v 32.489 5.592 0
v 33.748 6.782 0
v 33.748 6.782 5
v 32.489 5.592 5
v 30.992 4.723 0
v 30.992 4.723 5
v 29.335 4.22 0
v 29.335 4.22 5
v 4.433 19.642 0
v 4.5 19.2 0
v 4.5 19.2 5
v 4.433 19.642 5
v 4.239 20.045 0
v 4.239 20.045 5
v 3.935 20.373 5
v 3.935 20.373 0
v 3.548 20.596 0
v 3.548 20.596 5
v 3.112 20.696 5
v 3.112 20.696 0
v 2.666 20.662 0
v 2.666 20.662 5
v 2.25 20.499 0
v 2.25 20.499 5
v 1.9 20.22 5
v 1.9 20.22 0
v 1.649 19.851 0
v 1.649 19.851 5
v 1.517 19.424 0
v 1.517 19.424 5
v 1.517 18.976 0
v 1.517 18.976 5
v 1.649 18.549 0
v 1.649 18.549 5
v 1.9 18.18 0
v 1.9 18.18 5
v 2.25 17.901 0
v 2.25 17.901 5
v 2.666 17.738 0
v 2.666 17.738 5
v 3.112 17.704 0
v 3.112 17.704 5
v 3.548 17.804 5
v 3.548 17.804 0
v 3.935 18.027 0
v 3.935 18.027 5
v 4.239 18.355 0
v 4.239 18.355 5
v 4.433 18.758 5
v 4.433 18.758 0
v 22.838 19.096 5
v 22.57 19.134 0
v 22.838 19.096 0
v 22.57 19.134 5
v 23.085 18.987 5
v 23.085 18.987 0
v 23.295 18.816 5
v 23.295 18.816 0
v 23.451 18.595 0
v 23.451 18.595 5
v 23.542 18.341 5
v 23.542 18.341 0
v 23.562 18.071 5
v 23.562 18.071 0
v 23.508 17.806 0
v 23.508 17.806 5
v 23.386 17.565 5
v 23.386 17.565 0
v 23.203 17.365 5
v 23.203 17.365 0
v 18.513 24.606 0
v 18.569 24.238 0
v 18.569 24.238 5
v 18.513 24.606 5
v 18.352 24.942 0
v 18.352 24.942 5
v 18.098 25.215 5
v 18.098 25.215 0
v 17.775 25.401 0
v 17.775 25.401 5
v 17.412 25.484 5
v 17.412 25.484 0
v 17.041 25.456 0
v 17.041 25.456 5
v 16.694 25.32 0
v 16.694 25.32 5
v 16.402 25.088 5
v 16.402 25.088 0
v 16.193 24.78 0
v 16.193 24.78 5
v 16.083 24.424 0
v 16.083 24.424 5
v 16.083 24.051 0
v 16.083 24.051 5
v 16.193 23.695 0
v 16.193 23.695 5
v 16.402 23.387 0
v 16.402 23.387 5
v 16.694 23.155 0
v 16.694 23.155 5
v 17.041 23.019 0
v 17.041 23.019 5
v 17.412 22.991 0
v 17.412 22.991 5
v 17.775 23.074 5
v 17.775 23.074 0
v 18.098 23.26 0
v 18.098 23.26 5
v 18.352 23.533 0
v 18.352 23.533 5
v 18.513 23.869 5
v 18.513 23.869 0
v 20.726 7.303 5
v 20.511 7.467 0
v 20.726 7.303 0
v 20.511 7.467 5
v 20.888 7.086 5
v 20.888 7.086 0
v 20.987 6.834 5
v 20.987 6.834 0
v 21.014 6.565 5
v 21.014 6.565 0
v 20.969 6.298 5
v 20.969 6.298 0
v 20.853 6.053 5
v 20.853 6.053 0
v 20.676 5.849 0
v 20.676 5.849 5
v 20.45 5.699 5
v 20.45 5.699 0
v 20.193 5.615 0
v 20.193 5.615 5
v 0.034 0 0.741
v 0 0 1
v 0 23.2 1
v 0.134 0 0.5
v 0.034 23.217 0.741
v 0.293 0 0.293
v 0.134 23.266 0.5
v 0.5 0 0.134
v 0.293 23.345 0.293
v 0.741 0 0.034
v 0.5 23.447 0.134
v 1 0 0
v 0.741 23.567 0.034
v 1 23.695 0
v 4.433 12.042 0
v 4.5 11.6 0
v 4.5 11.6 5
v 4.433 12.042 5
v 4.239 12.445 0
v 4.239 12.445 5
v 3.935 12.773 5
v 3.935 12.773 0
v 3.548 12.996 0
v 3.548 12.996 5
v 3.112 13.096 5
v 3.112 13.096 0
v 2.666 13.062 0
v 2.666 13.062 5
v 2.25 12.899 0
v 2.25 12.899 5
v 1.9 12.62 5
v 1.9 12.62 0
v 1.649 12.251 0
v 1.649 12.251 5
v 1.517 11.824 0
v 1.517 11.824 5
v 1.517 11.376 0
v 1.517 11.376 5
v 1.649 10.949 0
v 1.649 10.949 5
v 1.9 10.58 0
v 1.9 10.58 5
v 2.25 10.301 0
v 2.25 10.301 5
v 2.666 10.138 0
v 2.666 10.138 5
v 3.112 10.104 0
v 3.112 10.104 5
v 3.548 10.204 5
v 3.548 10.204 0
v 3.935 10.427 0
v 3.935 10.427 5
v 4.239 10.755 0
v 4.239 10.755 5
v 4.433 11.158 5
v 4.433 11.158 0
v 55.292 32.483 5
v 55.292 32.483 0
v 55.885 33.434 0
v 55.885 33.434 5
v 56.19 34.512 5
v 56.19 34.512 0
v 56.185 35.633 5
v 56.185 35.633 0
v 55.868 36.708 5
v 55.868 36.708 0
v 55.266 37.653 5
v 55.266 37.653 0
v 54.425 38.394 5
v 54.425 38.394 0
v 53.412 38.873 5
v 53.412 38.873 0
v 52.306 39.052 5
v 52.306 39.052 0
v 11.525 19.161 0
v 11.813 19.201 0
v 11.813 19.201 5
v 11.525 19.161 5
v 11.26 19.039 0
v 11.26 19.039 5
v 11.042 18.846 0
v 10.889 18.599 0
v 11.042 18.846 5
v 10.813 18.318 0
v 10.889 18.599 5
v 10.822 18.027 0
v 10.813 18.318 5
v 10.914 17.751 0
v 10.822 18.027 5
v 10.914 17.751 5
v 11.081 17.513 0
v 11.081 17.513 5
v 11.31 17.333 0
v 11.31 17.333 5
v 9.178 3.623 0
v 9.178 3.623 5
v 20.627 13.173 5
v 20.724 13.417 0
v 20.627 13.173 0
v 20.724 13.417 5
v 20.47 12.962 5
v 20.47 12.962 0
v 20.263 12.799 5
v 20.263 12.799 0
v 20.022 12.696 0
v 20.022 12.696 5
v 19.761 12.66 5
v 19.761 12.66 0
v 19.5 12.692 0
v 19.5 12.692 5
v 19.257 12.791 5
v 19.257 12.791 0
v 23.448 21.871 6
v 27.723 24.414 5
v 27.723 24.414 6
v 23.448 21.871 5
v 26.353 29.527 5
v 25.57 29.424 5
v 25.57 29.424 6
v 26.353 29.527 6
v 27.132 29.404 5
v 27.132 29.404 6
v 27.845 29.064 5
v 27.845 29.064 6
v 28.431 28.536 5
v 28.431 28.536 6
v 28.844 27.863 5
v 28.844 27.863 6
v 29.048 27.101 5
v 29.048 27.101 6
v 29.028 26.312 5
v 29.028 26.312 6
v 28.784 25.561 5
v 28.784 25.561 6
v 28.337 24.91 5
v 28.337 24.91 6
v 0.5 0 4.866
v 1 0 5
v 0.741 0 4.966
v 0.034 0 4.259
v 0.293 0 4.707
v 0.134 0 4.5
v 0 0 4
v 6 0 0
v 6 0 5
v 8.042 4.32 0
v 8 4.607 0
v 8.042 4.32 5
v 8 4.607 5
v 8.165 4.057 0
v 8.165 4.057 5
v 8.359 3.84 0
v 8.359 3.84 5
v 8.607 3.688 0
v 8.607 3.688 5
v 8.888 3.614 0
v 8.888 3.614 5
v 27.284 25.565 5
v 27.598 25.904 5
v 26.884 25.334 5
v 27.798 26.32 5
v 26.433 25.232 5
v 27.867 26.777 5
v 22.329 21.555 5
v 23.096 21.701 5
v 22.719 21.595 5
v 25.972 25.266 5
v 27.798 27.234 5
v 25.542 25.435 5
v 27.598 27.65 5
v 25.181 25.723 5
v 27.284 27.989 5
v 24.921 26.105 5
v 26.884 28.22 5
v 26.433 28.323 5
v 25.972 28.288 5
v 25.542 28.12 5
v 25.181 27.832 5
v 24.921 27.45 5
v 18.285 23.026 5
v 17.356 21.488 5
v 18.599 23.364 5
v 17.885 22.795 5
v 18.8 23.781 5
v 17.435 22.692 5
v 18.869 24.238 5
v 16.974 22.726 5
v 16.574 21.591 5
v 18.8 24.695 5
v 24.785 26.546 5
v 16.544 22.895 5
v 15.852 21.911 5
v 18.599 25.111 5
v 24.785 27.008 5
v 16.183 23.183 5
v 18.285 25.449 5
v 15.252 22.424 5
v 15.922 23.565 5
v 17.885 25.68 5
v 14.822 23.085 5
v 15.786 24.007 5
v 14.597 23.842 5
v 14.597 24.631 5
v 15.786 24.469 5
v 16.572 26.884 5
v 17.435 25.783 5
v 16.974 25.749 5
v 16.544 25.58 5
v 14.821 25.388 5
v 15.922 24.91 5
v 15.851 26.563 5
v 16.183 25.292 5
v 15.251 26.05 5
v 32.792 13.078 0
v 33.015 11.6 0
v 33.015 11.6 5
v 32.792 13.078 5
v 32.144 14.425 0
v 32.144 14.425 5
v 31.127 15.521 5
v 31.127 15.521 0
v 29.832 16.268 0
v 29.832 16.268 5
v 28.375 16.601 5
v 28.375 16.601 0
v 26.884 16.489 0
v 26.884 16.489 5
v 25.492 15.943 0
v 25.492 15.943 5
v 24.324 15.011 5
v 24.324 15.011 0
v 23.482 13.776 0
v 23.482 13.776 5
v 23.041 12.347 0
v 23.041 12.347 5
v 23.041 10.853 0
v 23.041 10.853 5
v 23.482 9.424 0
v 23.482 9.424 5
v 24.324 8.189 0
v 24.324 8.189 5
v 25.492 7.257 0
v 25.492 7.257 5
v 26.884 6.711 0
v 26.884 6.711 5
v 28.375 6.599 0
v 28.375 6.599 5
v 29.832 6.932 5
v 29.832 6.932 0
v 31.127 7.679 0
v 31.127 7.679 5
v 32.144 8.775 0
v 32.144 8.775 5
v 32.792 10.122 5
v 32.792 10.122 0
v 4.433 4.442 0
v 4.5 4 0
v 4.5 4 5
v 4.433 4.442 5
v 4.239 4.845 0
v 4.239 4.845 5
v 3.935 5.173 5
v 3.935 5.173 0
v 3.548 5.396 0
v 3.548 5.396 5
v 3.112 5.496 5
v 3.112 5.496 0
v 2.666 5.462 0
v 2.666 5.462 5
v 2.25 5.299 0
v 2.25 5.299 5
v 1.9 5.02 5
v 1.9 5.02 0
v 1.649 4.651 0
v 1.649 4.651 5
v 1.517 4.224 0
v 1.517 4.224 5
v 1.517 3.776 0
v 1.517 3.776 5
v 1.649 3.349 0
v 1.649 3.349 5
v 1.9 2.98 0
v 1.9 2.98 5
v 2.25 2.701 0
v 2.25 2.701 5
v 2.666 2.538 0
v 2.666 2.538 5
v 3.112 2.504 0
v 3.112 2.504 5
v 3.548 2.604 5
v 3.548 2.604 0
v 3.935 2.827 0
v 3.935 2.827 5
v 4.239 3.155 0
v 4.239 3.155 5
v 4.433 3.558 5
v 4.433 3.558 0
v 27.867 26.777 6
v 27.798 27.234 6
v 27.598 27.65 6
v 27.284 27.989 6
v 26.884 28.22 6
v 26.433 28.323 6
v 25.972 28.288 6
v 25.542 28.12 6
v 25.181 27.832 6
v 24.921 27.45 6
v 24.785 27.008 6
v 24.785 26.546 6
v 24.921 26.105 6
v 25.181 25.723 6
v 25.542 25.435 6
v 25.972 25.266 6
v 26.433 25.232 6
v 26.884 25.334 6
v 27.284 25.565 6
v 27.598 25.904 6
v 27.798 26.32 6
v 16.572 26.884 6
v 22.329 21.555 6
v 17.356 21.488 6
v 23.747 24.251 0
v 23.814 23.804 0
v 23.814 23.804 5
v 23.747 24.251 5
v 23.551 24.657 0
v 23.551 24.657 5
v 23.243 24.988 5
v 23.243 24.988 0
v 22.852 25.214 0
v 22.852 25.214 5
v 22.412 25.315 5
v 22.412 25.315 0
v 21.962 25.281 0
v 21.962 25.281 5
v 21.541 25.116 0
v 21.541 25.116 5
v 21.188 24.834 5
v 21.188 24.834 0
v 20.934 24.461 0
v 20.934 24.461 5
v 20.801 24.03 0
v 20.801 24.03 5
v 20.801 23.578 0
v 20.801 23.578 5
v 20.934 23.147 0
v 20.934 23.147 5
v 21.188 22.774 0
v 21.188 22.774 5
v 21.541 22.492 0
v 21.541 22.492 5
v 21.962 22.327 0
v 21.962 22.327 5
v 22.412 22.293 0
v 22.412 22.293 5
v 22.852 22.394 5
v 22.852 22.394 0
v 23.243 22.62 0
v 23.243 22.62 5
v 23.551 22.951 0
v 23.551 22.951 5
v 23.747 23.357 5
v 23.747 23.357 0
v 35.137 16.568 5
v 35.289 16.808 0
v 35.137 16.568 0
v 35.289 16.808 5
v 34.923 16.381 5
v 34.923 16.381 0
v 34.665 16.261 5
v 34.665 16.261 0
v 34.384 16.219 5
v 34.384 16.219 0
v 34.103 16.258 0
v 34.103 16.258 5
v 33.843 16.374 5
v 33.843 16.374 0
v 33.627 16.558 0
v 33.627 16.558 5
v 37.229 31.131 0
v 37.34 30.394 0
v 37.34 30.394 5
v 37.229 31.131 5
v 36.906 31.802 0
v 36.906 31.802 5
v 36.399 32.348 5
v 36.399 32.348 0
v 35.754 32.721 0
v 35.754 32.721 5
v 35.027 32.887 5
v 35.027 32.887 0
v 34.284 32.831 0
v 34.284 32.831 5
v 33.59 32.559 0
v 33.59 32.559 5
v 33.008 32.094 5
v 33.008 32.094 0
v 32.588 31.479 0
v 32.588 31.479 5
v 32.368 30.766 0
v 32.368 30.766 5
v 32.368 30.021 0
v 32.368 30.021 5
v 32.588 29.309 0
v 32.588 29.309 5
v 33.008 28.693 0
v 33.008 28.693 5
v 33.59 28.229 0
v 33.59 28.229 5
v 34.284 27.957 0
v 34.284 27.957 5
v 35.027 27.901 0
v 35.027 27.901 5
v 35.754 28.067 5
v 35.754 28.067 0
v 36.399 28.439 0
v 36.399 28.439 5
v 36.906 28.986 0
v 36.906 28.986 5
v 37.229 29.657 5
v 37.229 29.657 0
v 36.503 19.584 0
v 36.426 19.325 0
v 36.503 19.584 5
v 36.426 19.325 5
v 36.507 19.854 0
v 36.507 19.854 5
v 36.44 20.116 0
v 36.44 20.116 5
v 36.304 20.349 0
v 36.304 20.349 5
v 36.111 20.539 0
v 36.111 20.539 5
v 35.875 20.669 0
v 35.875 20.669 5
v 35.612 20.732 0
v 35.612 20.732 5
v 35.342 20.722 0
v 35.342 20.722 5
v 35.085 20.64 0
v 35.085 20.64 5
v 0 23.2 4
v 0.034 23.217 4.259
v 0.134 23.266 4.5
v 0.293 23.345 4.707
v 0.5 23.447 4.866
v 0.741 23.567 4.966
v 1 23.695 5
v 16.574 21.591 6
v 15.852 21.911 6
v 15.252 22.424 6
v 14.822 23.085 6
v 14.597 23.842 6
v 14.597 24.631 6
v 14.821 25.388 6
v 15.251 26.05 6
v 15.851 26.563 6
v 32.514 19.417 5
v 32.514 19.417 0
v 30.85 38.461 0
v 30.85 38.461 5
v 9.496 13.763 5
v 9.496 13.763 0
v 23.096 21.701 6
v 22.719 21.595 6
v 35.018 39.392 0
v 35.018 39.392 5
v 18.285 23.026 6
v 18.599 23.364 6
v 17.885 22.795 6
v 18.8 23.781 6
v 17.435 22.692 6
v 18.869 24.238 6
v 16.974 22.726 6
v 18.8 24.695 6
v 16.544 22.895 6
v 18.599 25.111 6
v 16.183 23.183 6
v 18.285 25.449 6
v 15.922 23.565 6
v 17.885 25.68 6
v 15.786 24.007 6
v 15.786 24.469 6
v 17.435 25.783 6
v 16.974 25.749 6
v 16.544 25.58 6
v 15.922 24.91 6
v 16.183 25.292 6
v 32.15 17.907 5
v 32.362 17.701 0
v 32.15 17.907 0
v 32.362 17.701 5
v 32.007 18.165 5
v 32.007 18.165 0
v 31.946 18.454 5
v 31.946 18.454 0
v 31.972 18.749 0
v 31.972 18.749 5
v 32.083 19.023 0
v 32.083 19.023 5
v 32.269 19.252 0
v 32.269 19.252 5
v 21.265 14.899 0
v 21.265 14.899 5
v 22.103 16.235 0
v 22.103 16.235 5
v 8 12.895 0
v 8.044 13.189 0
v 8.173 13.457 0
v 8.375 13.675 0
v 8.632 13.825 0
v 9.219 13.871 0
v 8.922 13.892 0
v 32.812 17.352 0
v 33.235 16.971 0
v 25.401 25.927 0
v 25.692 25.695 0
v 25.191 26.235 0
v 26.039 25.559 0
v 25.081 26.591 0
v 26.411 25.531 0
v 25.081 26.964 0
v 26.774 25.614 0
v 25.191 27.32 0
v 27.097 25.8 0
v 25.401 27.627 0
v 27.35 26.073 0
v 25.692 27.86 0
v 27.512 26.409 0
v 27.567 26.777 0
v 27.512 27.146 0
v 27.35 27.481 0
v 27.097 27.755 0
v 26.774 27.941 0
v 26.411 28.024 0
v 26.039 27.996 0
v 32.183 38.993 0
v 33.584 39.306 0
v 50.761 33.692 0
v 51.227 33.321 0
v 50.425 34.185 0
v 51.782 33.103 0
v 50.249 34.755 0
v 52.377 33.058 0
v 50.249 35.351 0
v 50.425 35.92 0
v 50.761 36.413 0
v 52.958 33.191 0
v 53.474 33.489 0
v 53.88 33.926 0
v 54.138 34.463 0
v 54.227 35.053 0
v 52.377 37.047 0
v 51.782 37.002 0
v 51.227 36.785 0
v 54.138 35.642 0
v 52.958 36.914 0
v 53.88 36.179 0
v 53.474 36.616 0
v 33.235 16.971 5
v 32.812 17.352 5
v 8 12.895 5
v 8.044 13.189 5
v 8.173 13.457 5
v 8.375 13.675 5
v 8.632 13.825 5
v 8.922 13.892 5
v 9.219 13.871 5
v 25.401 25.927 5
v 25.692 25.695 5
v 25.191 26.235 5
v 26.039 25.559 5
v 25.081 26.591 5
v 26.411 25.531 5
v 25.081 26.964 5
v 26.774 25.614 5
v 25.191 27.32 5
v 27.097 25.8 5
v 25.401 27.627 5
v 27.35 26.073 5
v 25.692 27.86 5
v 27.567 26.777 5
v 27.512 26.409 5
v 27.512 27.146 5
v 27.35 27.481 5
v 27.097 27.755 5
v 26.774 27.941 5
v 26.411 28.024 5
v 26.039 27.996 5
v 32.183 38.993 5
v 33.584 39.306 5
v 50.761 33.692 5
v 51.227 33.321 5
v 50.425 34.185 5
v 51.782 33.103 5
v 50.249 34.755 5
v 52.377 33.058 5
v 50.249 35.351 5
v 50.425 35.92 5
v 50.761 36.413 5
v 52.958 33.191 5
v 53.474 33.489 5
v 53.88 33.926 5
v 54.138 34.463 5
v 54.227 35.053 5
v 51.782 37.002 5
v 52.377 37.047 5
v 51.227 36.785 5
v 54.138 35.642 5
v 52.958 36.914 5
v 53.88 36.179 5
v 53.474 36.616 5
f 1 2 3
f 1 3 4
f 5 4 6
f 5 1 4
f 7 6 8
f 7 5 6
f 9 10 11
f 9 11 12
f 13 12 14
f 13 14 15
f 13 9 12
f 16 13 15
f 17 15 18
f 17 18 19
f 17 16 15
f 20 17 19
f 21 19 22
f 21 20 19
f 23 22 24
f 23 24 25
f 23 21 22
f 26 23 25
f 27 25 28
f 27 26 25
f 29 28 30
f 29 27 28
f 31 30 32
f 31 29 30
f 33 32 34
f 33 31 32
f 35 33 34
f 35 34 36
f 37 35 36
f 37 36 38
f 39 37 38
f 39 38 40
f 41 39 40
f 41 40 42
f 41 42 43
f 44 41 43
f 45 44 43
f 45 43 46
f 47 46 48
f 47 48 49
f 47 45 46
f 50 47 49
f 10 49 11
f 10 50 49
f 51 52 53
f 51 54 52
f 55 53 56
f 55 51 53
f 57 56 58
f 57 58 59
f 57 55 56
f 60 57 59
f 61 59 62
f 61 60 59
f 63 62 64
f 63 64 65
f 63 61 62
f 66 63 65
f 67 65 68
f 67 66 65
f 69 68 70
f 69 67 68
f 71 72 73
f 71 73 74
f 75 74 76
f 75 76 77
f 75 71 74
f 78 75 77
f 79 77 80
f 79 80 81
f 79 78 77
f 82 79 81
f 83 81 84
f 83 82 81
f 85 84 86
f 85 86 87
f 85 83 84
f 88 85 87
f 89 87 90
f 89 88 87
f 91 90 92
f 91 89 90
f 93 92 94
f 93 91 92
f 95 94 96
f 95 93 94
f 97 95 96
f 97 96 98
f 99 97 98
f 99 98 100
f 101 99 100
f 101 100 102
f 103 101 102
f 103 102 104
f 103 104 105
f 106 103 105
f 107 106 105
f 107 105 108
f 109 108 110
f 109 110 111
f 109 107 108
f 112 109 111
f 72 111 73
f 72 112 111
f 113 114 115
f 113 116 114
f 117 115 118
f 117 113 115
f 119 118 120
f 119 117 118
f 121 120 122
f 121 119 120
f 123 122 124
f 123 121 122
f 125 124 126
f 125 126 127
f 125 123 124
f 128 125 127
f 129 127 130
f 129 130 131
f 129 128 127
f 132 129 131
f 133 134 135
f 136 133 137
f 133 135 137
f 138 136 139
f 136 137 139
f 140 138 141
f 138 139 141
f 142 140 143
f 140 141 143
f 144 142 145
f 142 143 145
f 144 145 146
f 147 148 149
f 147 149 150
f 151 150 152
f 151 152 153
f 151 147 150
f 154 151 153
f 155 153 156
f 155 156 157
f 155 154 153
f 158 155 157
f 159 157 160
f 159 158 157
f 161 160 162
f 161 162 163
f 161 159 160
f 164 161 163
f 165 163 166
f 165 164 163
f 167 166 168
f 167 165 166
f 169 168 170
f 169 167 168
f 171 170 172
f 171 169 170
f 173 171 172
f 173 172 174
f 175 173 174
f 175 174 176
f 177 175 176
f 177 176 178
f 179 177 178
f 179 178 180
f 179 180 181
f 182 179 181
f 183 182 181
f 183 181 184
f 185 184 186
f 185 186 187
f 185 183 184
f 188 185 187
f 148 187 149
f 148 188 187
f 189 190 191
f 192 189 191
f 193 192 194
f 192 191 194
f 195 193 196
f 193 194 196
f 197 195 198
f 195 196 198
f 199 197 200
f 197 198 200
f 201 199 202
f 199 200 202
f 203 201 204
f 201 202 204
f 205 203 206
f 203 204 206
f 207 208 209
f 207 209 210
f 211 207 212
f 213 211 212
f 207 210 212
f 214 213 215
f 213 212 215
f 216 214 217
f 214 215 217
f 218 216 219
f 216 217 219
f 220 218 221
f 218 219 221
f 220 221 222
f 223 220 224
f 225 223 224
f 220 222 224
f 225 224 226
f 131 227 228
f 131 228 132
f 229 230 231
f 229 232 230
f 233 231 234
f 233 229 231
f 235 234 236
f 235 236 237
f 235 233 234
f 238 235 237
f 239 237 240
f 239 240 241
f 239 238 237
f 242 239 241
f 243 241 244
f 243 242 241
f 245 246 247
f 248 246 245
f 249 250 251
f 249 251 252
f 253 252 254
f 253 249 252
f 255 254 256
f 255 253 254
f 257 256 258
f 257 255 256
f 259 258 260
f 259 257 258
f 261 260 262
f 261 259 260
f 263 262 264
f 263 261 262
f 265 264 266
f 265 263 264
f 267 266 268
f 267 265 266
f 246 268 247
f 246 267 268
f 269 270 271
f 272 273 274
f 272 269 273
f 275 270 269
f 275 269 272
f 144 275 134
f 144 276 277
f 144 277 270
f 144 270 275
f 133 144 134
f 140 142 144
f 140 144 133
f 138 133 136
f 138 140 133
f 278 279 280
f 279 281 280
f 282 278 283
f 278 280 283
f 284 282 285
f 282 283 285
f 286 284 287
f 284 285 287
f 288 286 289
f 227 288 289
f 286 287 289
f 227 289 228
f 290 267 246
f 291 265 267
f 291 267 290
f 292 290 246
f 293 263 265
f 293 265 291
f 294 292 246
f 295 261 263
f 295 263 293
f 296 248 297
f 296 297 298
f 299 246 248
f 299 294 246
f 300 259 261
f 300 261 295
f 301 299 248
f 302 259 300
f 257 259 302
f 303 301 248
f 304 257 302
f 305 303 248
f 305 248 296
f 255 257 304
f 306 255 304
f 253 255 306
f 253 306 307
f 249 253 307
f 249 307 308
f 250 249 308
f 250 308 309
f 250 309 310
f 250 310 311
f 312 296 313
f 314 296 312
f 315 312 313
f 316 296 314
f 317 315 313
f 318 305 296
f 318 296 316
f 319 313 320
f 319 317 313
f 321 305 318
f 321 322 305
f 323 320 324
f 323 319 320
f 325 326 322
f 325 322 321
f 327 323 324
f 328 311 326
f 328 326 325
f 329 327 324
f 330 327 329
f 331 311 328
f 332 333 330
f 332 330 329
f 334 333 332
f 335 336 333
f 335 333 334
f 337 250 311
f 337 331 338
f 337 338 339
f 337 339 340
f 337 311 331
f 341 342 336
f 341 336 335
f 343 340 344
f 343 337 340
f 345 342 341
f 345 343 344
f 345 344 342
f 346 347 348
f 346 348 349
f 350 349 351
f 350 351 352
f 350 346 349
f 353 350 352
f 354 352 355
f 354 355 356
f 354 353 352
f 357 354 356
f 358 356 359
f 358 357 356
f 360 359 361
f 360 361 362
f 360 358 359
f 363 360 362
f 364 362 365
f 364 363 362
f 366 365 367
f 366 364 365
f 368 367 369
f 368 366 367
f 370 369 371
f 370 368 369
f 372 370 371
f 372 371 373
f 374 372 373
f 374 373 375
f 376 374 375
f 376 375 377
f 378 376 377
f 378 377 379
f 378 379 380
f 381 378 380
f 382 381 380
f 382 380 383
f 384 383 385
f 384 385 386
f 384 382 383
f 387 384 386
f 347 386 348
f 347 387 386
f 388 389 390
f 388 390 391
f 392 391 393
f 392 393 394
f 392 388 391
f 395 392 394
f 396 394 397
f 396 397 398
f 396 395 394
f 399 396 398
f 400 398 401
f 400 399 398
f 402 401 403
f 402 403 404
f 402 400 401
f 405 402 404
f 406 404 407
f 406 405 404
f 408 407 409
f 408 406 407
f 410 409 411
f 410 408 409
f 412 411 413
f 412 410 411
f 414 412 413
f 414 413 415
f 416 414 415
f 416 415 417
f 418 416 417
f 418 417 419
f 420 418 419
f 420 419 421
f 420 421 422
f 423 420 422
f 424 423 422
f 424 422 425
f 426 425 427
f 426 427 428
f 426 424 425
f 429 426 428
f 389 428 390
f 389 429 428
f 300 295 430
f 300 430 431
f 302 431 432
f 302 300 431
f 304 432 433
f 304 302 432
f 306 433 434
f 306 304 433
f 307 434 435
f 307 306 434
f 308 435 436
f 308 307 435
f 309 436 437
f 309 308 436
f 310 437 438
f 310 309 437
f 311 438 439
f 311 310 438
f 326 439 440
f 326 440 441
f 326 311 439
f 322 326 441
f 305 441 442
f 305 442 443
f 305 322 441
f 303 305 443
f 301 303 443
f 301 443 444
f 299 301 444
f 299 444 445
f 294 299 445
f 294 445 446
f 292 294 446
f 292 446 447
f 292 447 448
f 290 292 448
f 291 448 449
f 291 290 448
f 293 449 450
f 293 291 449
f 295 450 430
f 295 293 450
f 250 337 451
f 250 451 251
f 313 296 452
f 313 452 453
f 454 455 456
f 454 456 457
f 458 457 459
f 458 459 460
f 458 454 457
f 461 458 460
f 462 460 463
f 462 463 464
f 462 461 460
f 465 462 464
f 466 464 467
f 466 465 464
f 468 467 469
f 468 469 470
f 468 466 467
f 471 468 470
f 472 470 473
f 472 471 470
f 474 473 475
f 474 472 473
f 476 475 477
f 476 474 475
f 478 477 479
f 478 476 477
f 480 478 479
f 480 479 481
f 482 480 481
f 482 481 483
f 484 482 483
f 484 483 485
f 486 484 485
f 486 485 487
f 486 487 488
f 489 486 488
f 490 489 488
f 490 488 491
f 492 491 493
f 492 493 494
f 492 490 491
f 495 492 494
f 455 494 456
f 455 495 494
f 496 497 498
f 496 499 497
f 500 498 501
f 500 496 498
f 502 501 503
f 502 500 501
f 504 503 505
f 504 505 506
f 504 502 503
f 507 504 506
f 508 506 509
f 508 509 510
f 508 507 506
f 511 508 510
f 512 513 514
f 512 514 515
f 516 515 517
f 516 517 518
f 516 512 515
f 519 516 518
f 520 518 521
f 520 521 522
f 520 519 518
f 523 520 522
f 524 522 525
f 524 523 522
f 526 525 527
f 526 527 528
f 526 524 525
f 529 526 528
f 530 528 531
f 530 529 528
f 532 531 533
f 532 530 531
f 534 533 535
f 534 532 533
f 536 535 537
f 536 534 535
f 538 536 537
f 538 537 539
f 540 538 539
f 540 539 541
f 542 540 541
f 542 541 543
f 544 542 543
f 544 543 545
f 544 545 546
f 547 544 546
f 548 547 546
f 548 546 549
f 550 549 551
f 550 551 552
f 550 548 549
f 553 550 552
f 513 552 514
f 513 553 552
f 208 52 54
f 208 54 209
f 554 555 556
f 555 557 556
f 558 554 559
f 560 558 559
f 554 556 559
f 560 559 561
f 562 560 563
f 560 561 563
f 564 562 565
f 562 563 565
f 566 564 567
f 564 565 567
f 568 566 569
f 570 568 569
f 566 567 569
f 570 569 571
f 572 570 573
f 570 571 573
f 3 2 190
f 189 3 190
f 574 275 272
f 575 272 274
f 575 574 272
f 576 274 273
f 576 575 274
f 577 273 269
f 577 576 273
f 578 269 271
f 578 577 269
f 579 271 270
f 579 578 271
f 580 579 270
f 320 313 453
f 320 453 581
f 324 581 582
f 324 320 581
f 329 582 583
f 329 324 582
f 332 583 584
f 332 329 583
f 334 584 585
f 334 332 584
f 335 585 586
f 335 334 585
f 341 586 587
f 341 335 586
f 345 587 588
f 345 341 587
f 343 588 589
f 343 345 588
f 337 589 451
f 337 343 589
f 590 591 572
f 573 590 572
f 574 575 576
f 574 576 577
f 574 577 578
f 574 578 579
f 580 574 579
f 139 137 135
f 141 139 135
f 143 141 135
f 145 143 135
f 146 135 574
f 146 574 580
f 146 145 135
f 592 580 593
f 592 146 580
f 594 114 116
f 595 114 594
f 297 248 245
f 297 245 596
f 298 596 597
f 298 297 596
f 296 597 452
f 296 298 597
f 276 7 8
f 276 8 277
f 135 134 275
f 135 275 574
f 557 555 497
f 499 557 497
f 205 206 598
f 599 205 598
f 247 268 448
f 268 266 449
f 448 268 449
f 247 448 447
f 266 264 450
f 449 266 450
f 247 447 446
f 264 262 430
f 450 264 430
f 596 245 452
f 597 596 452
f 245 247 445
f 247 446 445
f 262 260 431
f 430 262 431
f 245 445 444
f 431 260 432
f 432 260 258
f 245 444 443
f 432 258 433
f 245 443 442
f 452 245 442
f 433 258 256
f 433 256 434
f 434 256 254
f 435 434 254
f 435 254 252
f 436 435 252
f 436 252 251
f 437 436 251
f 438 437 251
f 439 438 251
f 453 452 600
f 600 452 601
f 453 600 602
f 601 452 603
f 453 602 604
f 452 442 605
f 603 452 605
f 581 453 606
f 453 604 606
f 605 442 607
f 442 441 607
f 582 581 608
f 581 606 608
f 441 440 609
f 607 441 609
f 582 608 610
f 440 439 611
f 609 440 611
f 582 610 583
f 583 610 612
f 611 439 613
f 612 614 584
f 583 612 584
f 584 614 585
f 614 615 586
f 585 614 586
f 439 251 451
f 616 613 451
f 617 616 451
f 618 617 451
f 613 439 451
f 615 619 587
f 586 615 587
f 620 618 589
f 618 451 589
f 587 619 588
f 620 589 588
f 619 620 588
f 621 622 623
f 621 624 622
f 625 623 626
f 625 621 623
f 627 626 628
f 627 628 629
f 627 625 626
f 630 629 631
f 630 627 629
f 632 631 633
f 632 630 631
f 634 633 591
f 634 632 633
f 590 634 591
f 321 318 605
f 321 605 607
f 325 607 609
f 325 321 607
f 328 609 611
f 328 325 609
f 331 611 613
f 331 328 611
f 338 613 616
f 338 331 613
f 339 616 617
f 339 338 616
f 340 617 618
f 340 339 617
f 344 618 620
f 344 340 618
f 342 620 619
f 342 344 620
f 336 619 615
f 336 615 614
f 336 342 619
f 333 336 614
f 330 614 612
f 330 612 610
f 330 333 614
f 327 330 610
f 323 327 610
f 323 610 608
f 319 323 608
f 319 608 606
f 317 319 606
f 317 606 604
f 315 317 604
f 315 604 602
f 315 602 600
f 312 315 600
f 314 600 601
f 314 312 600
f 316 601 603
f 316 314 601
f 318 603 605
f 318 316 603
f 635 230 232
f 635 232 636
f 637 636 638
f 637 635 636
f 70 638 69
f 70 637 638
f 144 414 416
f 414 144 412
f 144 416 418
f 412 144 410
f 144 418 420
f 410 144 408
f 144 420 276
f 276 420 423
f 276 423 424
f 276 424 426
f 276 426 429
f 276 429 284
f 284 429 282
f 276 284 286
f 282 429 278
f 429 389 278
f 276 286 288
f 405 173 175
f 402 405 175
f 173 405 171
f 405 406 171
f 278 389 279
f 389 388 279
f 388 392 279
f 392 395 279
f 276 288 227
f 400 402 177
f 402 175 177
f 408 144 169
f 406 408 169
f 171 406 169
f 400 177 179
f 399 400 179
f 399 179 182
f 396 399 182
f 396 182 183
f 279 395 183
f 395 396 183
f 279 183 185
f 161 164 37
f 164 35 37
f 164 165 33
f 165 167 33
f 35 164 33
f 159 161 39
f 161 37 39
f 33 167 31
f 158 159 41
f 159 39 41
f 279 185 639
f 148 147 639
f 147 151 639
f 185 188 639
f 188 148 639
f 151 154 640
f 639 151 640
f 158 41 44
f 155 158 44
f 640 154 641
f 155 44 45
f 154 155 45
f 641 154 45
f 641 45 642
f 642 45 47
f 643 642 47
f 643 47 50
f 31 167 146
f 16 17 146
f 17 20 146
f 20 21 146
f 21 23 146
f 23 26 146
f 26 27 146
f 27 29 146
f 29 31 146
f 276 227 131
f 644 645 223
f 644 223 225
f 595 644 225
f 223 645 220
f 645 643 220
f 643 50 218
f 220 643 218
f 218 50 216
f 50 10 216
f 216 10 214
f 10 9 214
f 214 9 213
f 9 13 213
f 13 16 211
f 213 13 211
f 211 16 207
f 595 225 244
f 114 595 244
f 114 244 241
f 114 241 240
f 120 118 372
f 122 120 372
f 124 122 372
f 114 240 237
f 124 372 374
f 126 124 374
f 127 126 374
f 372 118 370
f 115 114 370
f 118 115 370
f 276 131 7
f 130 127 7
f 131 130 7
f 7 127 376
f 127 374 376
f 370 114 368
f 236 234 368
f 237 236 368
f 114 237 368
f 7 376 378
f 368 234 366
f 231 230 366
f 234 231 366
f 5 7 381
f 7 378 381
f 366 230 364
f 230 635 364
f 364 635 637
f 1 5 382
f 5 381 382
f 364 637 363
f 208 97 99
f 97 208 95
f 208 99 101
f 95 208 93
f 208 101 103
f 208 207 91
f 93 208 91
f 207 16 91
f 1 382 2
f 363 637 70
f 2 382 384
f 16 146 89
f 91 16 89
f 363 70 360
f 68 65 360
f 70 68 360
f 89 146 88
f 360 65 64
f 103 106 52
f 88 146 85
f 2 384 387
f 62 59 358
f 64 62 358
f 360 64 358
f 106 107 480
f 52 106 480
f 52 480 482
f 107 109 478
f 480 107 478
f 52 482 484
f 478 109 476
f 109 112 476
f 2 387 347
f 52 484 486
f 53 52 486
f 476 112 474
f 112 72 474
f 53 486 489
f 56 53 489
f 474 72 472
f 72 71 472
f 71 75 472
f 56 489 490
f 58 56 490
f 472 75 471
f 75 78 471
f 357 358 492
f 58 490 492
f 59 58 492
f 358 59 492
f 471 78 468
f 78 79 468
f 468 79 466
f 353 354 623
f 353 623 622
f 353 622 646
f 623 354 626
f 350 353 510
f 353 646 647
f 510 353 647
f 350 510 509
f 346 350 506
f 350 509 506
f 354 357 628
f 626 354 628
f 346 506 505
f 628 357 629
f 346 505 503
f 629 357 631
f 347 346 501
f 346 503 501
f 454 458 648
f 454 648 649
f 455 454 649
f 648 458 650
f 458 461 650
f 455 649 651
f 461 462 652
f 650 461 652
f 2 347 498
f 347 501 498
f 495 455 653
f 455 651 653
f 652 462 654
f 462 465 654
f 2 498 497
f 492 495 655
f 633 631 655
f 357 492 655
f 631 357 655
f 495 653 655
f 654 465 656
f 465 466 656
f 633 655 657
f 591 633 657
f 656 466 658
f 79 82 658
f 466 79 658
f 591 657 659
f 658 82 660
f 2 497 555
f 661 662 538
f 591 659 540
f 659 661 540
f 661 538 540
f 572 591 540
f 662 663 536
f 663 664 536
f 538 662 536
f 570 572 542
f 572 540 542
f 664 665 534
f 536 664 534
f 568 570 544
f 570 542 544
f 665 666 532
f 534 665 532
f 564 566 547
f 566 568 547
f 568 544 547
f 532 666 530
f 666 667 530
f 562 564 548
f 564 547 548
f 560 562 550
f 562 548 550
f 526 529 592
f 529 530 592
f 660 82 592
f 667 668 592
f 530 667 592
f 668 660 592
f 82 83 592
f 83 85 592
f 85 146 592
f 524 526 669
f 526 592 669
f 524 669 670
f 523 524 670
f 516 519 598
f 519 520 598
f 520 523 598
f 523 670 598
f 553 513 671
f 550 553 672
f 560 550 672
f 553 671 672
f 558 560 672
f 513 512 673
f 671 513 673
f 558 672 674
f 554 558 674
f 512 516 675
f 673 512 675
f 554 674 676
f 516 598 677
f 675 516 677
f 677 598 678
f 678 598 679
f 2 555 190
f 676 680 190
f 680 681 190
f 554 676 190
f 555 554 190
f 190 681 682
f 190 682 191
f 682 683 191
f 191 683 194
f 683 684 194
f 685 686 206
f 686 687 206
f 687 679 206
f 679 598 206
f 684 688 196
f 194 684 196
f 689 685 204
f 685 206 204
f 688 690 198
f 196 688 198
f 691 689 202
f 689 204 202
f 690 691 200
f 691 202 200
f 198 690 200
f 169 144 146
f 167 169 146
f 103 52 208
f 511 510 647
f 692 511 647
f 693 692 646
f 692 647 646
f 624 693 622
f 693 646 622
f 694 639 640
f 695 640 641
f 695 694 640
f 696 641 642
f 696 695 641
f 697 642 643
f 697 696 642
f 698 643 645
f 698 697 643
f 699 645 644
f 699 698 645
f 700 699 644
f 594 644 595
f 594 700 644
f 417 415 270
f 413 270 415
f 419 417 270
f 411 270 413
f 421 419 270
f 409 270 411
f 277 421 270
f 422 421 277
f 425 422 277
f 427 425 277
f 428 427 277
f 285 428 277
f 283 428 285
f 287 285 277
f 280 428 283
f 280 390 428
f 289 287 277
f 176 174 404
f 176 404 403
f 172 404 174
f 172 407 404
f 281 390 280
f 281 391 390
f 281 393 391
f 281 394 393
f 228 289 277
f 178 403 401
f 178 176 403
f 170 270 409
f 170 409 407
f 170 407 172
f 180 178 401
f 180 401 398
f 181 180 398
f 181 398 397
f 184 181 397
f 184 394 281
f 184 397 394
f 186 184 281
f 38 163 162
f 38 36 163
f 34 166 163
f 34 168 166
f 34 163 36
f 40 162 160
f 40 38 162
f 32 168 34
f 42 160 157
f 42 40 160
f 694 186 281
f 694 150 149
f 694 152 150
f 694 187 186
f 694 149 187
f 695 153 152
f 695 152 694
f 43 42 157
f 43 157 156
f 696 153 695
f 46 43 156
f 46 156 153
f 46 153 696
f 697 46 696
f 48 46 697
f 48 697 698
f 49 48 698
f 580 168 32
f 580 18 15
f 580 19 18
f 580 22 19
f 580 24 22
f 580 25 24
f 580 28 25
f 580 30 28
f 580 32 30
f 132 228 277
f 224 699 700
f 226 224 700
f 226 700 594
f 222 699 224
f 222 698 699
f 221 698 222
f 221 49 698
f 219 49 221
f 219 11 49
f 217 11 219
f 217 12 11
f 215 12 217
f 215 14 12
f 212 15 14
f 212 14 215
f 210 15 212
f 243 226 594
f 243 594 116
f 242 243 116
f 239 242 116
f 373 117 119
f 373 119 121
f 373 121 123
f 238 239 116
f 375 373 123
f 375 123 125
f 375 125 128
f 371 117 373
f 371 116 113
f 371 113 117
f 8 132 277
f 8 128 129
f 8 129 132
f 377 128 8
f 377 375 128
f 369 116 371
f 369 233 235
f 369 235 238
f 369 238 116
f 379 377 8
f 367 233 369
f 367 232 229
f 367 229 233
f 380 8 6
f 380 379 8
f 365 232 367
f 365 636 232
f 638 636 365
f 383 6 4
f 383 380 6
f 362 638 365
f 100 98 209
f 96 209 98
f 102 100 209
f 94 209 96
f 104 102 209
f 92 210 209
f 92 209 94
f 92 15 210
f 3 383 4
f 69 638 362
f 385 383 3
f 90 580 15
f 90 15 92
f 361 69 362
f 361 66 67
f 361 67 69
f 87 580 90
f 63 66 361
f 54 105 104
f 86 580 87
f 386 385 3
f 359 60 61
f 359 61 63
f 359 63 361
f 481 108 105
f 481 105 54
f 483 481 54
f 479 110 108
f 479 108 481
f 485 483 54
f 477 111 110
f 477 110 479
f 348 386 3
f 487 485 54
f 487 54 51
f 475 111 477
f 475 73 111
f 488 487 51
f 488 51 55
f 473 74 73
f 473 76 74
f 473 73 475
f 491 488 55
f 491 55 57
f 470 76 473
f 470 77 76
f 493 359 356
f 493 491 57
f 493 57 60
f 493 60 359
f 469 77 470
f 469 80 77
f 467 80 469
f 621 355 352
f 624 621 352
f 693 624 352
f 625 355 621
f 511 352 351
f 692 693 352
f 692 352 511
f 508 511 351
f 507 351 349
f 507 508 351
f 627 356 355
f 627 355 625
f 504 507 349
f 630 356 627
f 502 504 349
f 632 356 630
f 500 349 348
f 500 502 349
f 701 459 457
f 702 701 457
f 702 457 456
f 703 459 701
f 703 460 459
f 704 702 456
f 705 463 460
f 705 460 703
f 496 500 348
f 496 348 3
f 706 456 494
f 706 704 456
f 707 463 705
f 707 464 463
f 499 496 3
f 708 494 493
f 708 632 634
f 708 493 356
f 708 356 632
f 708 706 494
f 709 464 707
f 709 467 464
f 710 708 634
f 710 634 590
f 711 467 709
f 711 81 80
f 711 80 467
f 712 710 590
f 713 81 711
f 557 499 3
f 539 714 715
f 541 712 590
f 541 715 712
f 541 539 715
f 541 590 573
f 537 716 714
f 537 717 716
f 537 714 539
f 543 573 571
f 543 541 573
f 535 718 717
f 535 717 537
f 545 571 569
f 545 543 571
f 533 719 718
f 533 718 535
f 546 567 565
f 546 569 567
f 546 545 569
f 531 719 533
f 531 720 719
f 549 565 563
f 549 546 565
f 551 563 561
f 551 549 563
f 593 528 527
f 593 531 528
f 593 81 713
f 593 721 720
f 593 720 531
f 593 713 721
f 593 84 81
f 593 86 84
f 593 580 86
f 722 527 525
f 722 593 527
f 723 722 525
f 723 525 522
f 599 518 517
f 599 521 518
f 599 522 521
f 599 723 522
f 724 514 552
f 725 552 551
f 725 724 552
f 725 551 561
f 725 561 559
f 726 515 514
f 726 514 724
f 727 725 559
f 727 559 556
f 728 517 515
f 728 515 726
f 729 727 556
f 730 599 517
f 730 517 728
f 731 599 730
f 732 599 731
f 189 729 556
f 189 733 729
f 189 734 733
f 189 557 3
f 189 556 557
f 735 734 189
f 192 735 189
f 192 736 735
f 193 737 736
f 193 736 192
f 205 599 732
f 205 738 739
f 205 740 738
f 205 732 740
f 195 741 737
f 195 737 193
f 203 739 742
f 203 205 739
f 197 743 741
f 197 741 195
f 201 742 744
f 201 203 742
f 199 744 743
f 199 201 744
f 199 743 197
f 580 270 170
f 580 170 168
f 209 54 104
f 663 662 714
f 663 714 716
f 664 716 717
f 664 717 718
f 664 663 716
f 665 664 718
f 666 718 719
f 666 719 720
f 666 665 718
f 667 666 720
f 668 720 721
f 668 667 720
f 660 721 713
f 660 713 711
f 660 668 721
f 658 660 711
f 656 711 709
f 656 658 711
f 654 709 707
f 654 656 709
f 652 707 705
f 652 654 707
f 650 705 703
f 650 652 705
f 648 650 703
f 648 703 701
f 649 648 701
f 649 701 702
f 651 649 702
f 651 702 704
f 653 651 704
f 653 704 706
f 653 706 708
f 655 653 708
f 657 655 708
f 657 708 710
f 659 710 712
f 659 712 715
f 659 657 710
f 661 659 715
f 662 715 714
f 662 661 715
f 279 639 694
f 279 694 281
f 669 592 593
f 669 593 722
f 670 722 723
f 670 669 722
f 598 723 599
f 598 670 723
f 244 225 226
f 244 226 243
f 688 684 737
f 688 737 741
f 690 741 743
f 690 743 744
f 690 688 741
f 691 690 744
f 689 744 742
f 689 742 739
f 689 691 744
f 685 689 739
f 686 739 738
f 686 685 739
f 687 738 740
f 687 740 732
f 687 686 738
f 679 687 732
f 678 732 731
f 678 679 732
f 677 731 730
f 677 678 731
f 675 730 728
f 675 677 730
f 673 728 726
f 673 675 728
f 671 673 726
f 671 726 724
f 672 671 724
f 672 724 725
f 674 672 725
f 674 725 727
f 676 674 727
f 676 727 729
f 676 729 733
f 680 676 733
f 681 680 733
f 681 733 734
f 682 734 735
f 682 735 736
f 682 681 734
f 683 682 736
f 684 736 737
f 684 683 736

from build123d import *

# Parameters (mm, degrees)
SKETCH_1_R          = 1.5
SKETCH_1_R_2        = 5.015
SKETCH_1_R_3        = 2.5
SKETCH_1_R_4        = 1.515
SKETCH_1_R_5        = 1.25
EXTRUDE_1_DEPTH     = 5
FILLET_1_R          = 1
SKETCH_2_R          = 1.55
EXTRUDE_2_DEPTH     = 1
CUT_EXTRUDE_START   = -10
CUT_EXTRUDE_1_DEPTH = 10
FILLET_2_R          = 1
EXTRUDE_START       = -5
SKETCH_4_R          = 2
EXTRUDE_3_DEPTH     = 5


with BuildPart() as part:
    # 草图1 → 凸台-拉伸1 (new body)
    with BuildSketch(Plane.XY):
        with BuildLine():
            Line((0, 0), (0, 23.2))
            Line((0, 23.2), (30.849852826, 38.460791759))
            ThreePointArc((30.849852826, 38.460791759), (41.091229844, 36.86897111), (43.042953344, 26.6900482))
            Line((43.042953344, 26.6900482), (34.835458731, 8.513496487))
            ThreePointArc((34.835458731, 8.513496487), (32.614833027, 5.68786704), (29.3346121, 4.219701189))
            Line((29.3346121, 4.219701189), (6, 0))
            Line((6, 0), (0, 0))
        make_face()
        with Locations((3, 19.2)):
            Circle(SKETCH_1_R, mode=Mode.SUBTRACT)
        with Locations((3, 11.6)):
            Circle(SKETCH_1_R, mode=Mode.SUBTRACT)
        with Locations((3, 4)):
            Circle(SKETCH_1_R, mode=Mode.SUBTRACT)
        with Locations((28, 11.6)):
            Circle(SKETCH_1_R_2, mode=Mode.SUBTRACT)
        with Locations((34.840402867, 30.393852416)):
            Circle(SKETCH_1_R_3, mode=Mode.SUBTRACT)
        with Locations((22.298810634, 23.803988685)):
            Circle(SKETCH_1_R_4, mode=Mode.SUBTRACT)
        with Locations((17.318802705, 24.237631422)):
            Circle(SKETCH_1_R_5, mode=Mode.SUBTRACT)
        with Locations((26.317290694, 26.777260117)):
            Circle(SKETCH_1_R_5, mode=Mode.SUBTRACT)
    extrude(amount=EXTRUDE_1_DEPTH)

    # 圆角1
    fillet_1_edges = [part.edges().sort_by_distance(p)[0] for p in [
        (0, 11.6, 0),
        (0, 11.6, 5),
    ]]
    fillet(fillet_1_edges, radius=FILLET_1_R)

    # 草图3 → 切除-拉伸1 (cut)
    with BuildSketch(Plane.XY.offset(5).offset(CUT_EXTRUDE_START)):
        with BuildLine():
            Line((34.570478049, 15.216464877), (37.548117185, 21.810829453))
            Line((37.548117185, 21.810829453), (30.748975297, 18.578046633))
            ThreePointArc((30.748975297, 18.578046633), (32.953595729, 17.231331047), (34.570478049, 15.216464877))
        make_face()
        Polygon((8, 14.618103259), (8, 3.410325902), (22.896528211, 6.104131033), align=None)
        with BuildLine():
            Line((28.046942827, 19.09985309), (8, 19.225330237))
            Line((8, 19.225330237), (20.514901979, 12.072554345))
            ThreePointArc((20.514901979, 12.072554345), (22.883627253, 17.083860858), (28.046942827, 19.09985309))
        make_face()
    extrude(amount=CUT_EXTRUDE_1_DEPTH, mode=Mode.SUBTRACT)

    # 圆角2
    fillet_2_edges = [part.edges().sort_by_distance(p)[0] for p in [
        (22.896528211, 6.104131033, 2.5),
        (8, 3.410325902, 2.5),
        (30.748975297, 18.578046633, 2.5),
        (37.548117185, 21.810829453, 2.5),
        (34.570478049, 15.216464877, 2.5),
        (8, 14.618103259, 2.5),
        (20.514901979, 12.072554345, 2.5),
        (8, 19.225330237, 2.5),
    ]]
    fillet(fillet_2_edges, radius=FILLET_2_R)
    fillet_2_2_edges = [part.edges().sort_by_distance(p)[0] for p in [
        (28.046942827, 19.09985309, 2.5),
    ]]
    fillet(fillet_2_2_edges, radius=FILLET_2_R)

    # 草图4 → 凸台-拉伸3 (add)
    with BuildSketch(Plane.XY.offset(5).offset(EXTRUDE_START)):
        with BuildLine():
            Line((52.3057854, 39.051820594), (35.017517601, 39.39210949))
            ThreePointArc((35.017517601, 39.39210949), (42.448969585, 35.201108648), (43.042953344, 26.6900482))
            Line((43.042953344, 26.6900482), (34.835458731, 8.513496487))
            ThreePointArc((34.835458731, 8.513496487), (34.350844876, 7.610417396), (33.747636481, 6.781839056))
            Line((33.747636481, 6.781839056), (55.292473863, 32.482909391))
            ThreePointArc((55.292473863, 32.482909391), (55.868362453, 36.708183585), (52.3057854, 39.051820594))
        make_face()
        with Locations((52.22706774, 35.052595228)):
            Circle(SKETCH_4_R, mode=Mode.SUBTRACT)
    extrude(amount=EXTRUDE_3_DEPTH)


with BuildPart() as body_2:
    # 草图2 → 凸台-拉伸2 (new body)
    with BuildSketch(Plane.XY.offset(5)):
        with BuildLine():
            Line((16.571853089, 26.884245537), (25.570341078, 29.423874231))
            ThreePointArc((25.570341078, 29.423874231), (28.843923131, 27.862906713), (27.723099502, 24.413745446))
            Line((27.723099502, 24.413745446), (23.448431167, 21.871190298))
            ThreePointArc((23.448431167, 21.871190298), (22.909639512, 21.639681623), (22.329312241, 21.555343175))
            Line((22.329312241, 21.555343175), (17.356101471, 21.487884379))
            ThreePointArc((17.356101471, 21.487884379), (14.597391395, 23.842131129), (16.571853089, 26.884245537))
        make_face()
        with Locations((17.318802705, 24.237631422)):
            Circle(SKETCH_2_R, mode=Mode.SUBTRACT)
        with Locations((26.317290694, 26.777260117)):
            Circle(SKETCH_2_R, mode=Mode.SUBTRACT)
    extrude(amount=EXTRUDE_2_DEPTH)


solid = Compound([part.part, body_2.part])
